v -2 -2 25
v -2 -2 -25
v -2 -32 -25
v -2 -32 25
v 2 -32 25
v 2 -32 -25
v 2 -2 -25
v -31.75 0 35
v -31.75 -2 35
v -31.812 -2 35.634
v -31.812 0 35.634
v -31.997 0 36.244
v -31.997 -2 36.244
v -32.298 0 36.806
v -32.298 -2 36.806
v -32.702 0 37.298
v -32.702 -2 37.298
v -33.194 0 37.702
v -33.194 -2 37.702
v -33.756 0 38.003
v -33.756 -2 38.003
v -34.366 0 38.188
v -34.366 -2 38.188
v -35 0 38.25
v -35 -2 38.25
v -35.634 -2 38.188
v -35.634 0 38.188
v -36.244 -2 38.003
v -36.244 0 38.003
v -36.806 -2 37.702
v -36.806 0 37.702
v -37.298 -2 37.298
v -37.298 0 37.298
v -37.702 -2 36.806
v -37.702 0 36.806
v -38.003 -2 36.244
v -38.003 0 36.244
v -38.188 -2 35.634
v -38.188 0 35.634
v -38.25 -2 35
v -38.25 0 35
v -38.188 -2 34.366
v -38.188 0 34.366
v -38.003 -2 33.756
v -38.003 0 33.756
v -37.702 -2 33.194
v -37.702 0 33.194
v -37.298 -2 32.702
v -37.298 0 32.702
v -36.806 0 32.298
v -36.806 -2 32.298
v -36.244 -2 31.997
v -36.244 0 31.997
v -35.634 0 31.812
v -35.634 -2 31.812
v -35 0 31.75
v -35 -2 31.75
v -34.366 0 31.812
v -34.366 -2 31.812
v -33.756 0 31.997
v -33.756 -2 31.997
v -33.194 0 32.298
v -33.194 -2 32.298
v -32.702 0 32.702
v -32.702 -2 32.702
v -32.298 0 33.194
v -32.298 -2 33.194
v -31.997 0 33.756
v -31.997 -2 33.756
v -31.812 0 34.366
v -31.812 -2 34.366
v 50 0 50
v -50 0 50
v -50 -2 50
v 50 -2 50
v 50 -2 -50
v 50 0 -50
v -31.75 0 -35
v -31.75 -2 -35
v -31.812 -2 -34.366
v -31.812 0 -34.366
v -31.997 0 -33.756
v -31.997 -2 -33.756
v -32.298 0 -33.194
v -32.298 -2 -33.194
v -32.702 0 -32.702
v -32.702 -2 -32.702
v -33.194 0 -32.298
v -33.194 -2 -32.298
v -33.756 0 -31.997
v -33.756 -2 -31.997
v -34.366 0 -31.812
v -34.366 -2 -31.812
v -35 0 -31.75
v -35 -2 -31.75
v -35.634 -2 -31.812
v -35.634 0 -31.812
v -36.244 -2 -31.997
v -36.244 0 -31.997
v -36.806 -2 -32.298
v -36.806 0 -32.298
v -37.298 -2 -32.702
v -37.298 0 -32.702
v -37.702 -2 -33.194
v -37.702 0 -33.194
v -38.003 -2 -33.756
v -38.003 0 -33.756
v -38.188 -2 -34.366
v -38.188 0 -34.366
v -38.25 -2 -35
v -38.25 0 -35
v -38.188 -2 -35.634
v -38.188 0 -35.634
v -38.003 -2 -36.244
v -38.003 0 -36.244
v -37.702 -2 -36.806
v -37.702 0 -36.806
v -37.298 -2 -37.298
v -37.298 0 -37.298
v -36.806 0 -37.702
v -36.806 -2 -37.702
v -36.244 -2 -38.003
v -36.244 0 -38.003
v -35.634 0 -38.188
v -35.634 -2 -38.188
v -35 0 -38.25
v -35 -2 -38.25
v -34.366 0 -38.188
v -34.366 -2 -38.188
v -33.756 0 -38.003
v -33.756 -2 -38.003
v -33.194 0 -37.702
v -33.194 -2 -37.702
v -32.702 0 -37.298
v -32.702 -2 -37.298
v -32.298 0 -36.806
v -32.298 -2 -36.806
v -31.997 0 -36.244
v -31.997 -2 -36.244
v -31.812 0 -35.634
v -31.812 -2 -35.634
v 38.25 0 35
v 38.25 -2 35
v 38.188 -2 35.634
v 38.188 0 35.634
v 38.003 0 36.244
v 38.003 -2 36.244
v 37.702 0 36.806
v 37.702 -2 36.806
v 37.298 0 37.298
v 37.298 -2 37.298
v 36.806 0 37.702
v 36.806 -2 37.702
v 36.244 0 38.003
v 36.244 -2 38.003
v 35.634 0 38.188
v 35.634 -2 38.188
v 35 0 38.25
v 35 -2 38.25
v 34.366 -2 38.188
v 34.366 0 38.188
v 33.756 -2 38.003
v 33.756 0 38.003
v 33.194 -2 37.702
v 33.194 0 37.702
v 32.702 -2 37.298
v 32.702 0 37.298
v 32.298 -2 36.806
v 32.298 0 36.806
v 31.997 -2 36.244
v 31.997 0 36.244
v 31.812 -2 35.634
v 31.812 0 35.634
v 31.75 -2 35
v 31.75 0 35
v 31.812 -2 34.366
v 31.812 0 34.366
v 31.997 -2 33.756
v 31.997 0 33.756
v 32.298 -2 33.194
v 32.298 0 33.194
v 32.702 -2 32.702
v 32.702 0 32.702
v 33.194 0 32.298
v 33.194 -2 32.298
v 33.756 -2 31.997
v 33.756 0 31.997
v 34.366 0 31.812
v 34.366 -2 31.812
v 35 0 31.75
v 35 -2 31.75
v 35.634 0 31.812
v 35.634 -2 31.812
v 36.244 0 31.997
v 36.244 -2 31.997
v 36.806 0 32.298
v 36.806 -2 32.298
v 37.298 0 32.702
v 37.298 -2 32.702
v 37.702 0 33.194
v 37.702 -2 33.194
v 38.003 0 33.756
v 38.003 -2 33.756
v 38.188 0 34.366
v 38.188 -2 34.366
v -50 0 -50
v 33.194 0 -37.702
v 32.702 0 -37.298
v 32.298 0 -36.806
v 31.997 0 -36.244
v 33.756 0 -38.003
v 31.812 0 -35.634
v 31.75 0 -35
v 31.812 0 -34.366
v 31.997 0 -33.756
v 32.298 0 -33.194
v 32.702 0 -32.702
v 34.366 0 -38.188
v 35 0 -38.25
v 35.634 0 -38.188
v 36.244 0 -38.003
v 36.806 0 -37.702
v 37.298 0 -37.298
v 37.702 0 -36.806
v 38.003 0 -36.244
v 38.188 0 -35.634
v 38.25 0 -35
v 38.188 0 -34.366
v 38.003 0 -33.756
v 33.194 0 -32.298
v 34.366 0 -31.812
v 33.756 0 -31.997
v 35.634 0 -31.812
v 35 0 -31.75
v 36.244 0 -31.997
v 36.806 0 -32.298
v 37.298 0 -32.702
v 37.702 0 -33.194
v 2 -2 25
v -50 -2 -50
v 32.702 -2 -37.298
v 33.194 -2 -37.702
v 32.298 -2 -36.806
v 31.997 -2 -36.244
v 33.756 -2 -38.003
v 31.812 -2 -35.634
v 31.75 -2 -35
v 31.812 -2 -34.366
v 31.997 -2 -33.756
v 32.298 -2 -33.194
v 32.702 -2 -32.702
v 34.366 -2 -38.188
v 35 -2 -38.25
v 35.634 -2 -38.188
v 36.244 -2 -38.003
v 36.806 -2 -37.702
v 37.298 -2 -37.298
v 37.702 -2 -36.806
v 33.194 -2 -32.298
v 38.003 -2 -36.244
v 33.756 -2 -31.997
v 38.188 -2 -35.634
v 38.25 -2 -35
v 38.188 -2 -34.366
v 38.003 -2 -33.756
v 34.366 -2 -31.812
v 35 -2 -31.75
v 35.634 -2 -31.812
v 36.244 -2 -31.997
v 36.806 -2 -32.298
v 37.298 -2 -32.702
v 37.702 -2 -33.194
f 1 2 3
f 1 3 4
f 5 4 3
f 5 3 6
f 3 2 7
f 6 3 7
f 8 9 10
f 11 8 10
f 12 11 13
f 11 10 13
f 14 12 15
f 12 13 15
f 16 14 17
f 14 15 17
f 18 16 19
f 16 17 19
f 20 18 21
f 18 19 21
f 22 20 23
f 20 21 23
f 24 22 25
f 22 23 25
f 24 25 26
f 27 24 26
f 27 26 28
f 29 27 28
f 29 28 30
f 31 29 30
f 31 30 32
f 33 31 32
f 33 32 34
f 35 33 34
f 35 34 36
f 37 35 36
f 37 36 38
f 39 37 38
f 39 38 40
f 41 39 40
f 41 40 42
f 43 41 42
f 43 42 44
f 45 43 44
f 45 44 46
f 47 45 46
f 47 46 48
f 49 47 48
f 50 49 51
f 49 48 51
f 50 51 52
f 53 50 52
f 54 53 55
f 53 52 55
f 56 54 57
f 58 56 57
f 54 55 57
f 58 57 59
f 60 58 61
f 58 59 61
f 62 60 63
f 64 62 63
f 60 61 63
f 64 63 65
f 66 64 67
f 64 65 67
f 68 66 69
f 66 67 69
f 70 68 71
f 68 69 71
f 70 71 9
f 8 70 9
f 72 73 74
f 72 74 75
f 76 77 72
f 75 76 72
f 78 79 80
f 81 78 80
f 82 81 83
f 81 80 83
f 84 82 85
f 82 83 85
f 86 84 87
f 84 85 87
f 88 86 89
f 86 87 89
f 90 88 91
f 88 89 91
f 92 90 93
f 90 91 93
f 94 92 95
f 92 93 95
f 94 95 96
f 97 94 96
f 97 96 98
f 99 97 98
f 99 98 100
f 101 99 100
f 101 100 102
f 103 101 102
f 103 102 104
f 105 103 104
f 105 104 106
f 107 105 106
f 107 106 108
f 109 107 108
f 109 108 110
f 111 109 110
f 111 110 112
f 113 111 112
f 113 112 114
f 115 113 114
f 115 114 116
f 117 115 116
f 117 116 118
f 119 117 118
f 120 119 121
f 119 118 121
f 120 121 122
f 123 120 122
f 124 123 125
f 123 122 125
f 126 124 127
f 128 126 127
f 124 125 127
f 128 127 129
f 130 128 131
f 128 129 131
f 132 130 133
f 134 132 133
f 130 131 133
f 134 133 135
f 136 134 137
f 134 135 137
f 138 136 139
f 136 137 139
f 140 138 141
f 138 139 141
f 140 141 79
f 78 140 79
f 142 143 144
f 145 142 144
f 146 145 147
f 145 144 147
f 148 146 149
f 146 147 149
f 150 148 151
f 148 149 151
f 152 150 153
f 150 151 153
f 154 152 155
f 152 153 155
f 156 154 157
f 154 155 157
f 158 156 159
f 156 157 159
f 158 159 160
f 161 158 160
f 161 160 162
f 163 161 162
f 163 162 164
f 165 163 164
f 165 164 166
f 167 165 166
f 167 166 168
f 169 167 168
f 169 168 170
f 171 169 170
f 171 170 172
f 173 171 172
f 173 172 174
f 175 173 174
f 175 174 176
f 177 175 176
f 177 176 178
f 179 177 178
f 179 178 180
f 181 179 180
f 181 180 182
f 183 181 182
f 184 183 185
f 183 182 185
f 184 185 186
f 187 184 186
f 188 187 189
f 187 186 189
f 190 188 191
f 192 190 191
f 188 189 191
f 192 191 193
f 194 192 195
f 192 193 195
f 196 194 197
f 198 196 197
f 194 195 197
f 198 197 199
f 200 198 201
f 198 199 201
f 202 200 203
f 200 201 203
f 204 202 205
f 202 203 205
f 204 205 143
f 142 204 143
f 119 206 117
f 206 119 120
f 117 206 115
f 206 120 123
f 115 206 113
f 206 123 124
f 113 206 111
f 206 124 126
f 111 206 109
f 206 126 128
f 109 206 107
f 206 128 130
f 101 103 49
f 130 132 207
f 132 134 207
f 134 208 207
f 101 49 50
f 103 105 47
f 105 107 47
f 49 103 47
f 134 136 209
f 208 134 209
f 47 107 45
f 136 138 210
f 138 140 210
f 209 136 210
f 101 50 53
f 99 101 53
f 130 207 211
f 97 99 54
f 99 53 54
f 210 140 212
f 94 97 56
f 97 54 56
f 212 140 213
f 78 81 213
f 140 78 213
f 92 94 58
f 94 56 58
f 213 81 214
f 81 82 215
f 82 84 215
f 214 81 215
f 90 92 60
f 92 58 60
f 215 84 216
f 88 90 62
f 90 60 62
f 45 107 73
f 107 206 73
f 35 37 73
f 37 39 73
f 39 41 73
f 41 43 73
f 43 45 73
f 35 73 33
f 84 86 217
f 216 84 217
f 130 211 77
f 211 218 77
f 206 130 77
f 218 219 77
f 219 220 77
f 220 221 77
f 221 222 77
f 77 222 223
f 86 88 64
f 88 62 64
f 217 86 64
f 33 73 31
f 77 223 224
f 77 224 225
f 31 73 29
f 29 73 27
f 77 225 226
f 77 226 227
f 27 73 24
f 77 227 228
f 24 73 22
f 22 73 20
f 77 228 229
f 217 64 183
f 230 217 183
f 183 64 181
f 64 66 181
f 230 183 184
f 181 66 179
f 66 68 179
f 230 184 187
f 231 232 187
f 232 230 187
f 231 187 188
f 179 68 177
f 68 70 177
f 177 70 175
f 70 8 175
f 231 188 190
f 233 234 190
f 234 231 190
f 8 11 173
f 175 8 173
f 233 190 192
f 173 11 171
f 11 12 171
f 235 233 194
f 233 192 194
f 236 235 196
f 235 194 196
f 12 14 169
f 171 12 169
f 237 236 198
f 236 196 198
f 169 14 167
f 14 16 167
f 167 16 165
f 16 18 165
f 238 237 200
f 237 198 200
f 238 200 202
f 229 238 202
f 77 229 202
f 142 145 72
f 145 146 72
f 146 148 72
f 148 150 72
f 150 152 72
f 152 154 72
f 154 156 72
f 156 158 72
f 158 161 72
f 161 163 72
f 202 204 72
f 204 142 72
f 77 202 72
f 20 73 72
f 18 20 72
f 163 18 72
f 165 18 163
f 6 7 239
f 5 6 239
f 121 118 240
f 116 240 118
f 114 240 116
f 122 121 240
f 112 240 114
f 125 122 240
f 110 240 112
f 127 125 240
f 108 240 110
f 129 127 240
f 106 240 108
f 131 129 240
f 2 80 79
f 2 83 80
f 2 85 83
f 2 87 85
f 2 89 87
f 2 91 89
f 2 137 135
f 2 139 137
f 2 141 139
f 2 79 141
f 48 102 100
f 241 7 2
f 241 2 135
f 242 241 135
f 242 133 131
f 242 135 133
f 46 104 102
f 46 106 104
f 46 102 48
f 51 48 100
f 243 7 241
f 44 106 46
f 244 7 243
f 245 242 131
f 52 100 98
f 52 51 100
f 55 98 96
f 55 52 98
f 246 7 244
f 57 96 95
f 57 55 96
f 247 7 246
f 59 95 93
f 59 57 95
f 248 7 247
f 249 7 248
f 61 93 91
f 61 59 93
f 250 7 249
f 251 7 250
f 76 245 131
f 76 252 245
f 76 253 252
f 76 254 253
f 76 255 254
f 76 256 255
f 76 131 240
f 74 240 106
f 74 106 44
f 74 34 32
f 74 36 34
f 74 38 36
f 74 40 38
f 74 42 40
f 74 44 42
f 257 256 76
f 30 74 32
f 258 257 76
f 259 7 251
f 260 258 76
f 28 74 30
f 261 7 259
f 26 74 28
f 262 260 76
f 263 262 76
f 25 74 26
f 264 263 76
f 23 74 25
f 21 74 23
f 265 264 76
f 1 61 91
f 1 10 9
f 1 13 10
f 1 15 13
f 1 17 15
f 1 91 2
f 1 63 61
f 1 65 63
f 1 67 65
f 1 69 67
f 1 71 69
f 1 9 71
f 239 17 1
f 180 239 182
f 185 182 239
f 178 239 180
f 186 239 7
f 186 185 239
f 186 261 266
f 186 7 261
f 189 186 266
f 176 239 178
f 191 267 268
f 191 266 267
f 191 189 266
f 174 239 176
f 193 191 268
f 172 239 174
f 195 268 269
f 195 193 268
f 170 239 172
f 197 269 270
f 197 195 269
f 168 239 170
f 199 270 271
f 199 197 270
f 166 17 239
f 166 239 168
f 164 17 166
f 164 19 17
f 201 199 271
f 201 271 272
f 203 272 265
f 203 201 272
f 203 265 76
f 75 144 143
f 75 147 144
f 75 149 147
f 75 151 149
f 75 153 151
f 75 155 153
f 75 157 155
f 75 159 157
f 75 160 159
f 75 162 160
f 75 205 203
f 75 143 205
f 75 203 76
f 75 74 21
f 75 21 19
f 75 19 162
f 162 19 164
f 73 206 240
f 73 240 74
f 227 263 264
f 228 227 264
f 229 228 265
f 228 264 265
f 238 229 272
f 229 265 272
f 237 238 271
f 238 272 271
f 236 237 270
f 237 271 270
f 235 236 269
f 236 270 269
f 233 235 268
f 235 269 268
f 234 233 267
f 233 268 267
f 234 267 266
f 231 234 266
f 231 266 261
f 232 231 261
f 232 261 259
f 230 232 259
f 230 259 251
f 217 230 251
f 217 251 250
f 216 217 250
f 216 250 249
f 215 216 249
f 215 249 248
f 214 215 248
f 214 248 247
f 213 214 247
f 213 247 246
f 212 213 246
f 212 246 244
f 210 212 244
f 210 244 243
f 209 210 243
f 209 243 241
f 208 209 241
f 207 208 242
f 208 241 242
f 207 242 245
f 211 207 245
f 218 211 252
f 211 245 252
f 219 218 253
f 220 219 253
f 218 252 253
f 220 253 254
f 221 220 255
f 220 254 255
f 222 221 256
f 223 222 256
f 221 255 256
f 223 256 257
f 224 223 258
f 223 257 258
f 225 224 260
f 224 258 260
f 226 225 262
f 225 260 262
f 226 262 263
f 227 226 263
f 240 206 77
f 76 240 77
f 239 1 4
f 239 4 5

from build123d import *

# Parameters (mm, degrees)
F0_W     = 100
F0_H     = 100
F1_DEPTH = 2
F2_R     = 3.25
F3_DEPTH = 2.001
F4_W     = 4
F4_H     = 50
F5_DEPTH = 30


with BuildPart() as f1:
    # F0 (on Front) → F1 (new body)
    with BuildSketch(Plane.XZ):
        Rectangle(F0_W, F0_H)
    extrude(amount=F1_DEPTH)

    # F2 (on face) → F3 (cut, through all)
    with BuildSketch(Plane.XZ.offset(2)):
        with Locations((-35, 35)):
            Circle(F2_R)
        with Locations((35, 35)):
            Circle(F2_R)
        with Locations((-35, -35)):
            Circle(F2_R)
        with Locations((35, -35)):
            Circle(F2_R)
    extrude(amount=-F3_DEPTH, mode=Mode.SUBTRACT)

    # F4 (on face) → F5 (join)
    with BuildSketch(Plane.XZ.offset(2)):
        Rectangle(F4_W, F4_H)
    extrude(amount=F5_DEPTH)


solid = f1.part
